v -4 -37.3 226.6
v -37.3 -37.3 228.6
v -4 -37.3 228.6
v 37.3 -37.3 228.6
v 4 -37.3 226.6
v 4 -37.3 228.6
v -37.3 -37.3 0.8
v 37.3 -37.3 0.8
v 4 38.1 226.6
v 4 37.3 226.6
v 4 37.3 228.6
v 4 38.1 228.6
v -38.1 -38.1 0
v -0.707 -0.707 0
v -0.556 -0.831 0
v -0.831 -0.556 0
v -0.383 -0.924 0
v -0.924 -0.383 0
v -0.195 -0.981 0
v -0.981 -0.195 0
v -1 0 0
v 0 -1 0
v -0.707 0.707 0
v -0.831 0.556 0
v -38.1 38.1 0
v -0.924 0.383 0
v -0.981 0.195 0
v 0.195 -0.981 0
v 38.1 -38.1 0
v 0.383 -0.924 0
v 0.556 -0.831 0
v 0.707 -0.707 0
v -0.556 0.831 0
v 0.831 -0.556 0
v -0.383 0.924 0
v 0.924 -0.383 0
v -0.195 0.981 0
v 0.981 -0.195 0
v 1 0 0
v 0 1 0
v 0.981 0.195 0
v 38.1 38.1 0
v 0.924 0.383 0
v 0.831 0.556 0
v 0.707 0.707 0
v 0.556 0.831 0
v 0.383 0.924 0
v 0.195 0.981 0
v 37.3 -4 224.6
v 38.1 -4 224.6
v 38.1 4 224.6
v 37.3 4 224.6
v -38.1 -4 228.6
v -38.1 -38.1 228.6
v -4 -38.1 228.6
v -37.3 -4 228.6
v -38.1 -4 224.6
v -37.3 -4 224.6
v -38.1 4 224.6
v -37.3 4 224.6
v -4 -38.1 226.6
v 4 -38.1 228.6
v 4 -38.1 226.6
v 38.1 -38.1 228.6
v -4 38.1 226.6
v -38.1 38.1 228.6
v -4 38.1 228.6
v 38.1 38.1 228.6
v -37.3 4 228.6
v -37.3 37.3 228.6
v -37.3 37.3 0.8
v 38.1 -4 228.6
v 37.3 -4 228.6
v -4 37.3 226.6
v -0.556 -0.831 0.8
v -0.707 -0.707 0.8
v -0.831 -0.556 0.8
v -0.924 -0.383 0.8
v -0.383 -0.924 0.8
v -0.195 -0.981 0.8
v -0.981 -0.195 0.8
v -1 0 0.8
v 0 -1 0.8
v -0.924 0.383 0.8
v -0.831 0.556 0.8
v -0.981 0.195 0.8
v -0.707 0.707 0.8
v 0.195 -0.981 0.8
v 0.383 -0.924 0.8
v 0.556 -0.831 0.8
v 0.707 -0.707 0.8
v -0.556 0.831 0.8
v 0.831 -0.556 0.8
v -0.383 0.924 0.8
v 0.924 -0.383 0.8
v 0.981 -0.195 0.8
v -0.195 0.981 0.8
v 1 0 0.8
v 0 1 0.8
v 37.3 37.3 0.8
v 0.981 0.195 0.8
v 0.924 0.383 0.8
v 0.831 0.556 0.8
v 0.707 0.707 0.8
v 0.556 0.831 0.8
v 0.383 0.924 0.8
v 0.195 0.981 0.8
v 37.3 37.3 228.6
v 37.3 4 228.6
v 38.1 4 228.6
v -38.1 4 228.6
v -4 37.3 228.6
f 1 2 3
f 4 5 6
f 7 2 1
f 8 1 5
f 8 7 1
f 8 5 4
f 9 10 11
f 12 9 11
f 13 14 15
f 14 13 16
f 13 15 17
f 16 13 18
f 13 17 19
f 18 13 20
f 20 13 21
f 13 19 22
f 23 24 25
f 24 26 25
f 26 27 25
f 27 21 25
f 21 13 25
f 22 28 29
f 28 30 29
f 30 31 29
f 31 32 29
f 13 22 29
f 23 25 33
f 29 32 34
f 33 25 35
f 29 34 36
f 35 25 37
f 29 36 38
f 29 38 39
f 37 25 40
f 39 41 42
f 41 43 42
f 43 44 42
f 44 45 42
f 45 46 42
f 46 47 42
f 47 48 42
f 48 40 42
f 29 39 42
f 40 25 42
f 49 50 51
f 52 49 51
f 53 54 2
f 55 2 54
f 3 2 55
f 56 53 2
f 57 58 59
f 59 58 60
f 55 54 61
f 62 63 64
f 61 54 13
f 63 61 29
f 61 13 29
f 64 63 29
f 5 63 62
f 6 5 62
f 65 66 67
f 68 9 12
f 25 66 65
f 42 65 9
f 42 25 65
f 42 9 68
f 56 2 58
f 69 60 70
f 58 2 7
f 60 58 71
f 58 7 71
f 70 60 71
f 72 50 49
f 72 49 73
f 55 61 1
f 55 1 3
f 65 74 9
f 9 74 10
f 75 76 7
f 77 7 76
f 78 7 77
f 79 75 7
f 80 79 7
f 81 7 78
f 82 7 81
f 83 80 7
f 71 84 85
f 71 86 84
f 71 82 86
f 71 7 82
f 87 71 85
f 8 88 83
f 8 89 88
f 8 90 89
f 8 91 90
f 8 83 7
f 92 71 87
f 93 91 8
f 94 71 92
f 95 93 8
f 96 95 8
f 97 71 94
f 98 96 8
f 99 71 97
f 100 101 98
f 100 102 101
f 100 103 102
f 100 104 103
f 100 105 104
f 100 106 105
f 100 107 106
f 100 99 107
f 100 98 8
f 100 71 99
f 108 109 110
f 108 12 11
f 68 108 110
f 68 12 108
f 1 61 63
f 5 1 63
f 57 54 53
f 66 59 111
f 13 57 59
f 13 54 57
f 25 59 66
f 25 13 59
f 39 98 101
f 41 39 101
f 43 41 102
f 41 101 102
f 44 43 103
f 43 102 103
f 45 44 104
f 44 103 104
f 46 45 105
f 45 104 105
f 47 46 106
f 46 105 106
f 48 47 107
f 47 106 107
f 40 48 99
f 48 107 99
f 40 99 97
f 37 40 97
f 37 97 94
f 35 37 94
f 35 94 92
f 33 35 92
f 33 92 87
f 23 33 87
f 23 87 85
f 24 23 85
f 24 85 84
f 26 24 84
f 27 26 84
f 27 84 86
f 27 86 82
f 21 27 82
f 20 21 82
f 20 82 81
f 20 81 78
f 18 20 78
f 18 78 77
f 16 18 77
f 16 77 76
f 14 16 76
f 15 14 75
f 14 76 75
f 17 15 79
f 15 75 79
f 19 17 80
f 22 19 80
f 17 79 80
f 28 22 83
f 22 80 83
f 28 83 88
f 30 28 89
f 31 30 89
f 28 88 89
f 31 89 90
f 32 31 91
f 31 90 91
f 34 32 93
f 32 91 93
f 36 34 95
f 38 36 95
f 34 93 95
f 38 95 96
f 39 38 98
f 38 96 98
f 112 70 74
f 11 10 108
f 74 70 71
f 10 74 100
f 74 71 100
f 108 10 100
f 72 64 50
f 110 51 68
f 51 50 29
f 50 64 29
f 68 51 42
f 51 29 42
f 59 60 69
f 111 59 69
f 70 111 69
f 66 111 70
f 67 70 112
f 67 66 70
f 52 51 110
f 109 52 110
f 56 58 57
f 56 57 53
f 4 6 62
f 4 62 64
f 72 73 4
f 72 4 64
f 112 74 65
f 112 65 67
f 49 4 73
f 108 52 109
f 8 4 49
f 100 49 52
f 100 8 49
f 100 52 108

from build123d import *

# Parameters (mm, degrees)
F0_W     = 76.2
F0_H     = 76.2
F1_DEPTH = 228.6
F2_T     = -0.8
F3_R     = 1
F4_DEPTH = 25.4
F5_W     = 8
F5_H     = 2
F6_DEPTH = 76.201
F7_W     = 8
F7_H     = 4
F8_DEPTH = 76.201


with BuildPart() as f1:
    # F0 (on Top) → F1 (new body)
    with BuildSketch(Plane.XY):
        Rectangle(F0_W, F0_H)
    extrude(amount=F1_DEPTH)

    # F2
    f2_openings = [f1.faces().sort_by_distance(p)[0] for p in [
        (0, 0, 228.6),
    ]]
    offset(amount=F2_T, openings=f2_openings)

    # F3 (on face) → F4 (cut)
    with BuildSketch(Plane.XY.offset(0.8)):
        Circle(F3_R)
    extrude(amount=-F4_DEPTH, mode=Mode.SUBTRACT)

    # F5 (on face) → F6 (cut, through all)
    with BuildSketch(Plane.XZ.offset(38.1)):
        with Locations((0, 227.6)):
            Rectangle(F5_W, F5_H)
    extrude(amount=-F6_DEPTH, mode=Mode.SUBTRACT)

    # F7 (on face) → F8 (cut, through all)
    with BuildSketch(Plane.YZ.offset(38.1)):
        with Locations((0, 226.6)):
            Rectangle(F7_W, F7_H)
    extrude(amount=-F8_DEPTH, mode=Mode.SUBTRACT)


solid = f1.part
